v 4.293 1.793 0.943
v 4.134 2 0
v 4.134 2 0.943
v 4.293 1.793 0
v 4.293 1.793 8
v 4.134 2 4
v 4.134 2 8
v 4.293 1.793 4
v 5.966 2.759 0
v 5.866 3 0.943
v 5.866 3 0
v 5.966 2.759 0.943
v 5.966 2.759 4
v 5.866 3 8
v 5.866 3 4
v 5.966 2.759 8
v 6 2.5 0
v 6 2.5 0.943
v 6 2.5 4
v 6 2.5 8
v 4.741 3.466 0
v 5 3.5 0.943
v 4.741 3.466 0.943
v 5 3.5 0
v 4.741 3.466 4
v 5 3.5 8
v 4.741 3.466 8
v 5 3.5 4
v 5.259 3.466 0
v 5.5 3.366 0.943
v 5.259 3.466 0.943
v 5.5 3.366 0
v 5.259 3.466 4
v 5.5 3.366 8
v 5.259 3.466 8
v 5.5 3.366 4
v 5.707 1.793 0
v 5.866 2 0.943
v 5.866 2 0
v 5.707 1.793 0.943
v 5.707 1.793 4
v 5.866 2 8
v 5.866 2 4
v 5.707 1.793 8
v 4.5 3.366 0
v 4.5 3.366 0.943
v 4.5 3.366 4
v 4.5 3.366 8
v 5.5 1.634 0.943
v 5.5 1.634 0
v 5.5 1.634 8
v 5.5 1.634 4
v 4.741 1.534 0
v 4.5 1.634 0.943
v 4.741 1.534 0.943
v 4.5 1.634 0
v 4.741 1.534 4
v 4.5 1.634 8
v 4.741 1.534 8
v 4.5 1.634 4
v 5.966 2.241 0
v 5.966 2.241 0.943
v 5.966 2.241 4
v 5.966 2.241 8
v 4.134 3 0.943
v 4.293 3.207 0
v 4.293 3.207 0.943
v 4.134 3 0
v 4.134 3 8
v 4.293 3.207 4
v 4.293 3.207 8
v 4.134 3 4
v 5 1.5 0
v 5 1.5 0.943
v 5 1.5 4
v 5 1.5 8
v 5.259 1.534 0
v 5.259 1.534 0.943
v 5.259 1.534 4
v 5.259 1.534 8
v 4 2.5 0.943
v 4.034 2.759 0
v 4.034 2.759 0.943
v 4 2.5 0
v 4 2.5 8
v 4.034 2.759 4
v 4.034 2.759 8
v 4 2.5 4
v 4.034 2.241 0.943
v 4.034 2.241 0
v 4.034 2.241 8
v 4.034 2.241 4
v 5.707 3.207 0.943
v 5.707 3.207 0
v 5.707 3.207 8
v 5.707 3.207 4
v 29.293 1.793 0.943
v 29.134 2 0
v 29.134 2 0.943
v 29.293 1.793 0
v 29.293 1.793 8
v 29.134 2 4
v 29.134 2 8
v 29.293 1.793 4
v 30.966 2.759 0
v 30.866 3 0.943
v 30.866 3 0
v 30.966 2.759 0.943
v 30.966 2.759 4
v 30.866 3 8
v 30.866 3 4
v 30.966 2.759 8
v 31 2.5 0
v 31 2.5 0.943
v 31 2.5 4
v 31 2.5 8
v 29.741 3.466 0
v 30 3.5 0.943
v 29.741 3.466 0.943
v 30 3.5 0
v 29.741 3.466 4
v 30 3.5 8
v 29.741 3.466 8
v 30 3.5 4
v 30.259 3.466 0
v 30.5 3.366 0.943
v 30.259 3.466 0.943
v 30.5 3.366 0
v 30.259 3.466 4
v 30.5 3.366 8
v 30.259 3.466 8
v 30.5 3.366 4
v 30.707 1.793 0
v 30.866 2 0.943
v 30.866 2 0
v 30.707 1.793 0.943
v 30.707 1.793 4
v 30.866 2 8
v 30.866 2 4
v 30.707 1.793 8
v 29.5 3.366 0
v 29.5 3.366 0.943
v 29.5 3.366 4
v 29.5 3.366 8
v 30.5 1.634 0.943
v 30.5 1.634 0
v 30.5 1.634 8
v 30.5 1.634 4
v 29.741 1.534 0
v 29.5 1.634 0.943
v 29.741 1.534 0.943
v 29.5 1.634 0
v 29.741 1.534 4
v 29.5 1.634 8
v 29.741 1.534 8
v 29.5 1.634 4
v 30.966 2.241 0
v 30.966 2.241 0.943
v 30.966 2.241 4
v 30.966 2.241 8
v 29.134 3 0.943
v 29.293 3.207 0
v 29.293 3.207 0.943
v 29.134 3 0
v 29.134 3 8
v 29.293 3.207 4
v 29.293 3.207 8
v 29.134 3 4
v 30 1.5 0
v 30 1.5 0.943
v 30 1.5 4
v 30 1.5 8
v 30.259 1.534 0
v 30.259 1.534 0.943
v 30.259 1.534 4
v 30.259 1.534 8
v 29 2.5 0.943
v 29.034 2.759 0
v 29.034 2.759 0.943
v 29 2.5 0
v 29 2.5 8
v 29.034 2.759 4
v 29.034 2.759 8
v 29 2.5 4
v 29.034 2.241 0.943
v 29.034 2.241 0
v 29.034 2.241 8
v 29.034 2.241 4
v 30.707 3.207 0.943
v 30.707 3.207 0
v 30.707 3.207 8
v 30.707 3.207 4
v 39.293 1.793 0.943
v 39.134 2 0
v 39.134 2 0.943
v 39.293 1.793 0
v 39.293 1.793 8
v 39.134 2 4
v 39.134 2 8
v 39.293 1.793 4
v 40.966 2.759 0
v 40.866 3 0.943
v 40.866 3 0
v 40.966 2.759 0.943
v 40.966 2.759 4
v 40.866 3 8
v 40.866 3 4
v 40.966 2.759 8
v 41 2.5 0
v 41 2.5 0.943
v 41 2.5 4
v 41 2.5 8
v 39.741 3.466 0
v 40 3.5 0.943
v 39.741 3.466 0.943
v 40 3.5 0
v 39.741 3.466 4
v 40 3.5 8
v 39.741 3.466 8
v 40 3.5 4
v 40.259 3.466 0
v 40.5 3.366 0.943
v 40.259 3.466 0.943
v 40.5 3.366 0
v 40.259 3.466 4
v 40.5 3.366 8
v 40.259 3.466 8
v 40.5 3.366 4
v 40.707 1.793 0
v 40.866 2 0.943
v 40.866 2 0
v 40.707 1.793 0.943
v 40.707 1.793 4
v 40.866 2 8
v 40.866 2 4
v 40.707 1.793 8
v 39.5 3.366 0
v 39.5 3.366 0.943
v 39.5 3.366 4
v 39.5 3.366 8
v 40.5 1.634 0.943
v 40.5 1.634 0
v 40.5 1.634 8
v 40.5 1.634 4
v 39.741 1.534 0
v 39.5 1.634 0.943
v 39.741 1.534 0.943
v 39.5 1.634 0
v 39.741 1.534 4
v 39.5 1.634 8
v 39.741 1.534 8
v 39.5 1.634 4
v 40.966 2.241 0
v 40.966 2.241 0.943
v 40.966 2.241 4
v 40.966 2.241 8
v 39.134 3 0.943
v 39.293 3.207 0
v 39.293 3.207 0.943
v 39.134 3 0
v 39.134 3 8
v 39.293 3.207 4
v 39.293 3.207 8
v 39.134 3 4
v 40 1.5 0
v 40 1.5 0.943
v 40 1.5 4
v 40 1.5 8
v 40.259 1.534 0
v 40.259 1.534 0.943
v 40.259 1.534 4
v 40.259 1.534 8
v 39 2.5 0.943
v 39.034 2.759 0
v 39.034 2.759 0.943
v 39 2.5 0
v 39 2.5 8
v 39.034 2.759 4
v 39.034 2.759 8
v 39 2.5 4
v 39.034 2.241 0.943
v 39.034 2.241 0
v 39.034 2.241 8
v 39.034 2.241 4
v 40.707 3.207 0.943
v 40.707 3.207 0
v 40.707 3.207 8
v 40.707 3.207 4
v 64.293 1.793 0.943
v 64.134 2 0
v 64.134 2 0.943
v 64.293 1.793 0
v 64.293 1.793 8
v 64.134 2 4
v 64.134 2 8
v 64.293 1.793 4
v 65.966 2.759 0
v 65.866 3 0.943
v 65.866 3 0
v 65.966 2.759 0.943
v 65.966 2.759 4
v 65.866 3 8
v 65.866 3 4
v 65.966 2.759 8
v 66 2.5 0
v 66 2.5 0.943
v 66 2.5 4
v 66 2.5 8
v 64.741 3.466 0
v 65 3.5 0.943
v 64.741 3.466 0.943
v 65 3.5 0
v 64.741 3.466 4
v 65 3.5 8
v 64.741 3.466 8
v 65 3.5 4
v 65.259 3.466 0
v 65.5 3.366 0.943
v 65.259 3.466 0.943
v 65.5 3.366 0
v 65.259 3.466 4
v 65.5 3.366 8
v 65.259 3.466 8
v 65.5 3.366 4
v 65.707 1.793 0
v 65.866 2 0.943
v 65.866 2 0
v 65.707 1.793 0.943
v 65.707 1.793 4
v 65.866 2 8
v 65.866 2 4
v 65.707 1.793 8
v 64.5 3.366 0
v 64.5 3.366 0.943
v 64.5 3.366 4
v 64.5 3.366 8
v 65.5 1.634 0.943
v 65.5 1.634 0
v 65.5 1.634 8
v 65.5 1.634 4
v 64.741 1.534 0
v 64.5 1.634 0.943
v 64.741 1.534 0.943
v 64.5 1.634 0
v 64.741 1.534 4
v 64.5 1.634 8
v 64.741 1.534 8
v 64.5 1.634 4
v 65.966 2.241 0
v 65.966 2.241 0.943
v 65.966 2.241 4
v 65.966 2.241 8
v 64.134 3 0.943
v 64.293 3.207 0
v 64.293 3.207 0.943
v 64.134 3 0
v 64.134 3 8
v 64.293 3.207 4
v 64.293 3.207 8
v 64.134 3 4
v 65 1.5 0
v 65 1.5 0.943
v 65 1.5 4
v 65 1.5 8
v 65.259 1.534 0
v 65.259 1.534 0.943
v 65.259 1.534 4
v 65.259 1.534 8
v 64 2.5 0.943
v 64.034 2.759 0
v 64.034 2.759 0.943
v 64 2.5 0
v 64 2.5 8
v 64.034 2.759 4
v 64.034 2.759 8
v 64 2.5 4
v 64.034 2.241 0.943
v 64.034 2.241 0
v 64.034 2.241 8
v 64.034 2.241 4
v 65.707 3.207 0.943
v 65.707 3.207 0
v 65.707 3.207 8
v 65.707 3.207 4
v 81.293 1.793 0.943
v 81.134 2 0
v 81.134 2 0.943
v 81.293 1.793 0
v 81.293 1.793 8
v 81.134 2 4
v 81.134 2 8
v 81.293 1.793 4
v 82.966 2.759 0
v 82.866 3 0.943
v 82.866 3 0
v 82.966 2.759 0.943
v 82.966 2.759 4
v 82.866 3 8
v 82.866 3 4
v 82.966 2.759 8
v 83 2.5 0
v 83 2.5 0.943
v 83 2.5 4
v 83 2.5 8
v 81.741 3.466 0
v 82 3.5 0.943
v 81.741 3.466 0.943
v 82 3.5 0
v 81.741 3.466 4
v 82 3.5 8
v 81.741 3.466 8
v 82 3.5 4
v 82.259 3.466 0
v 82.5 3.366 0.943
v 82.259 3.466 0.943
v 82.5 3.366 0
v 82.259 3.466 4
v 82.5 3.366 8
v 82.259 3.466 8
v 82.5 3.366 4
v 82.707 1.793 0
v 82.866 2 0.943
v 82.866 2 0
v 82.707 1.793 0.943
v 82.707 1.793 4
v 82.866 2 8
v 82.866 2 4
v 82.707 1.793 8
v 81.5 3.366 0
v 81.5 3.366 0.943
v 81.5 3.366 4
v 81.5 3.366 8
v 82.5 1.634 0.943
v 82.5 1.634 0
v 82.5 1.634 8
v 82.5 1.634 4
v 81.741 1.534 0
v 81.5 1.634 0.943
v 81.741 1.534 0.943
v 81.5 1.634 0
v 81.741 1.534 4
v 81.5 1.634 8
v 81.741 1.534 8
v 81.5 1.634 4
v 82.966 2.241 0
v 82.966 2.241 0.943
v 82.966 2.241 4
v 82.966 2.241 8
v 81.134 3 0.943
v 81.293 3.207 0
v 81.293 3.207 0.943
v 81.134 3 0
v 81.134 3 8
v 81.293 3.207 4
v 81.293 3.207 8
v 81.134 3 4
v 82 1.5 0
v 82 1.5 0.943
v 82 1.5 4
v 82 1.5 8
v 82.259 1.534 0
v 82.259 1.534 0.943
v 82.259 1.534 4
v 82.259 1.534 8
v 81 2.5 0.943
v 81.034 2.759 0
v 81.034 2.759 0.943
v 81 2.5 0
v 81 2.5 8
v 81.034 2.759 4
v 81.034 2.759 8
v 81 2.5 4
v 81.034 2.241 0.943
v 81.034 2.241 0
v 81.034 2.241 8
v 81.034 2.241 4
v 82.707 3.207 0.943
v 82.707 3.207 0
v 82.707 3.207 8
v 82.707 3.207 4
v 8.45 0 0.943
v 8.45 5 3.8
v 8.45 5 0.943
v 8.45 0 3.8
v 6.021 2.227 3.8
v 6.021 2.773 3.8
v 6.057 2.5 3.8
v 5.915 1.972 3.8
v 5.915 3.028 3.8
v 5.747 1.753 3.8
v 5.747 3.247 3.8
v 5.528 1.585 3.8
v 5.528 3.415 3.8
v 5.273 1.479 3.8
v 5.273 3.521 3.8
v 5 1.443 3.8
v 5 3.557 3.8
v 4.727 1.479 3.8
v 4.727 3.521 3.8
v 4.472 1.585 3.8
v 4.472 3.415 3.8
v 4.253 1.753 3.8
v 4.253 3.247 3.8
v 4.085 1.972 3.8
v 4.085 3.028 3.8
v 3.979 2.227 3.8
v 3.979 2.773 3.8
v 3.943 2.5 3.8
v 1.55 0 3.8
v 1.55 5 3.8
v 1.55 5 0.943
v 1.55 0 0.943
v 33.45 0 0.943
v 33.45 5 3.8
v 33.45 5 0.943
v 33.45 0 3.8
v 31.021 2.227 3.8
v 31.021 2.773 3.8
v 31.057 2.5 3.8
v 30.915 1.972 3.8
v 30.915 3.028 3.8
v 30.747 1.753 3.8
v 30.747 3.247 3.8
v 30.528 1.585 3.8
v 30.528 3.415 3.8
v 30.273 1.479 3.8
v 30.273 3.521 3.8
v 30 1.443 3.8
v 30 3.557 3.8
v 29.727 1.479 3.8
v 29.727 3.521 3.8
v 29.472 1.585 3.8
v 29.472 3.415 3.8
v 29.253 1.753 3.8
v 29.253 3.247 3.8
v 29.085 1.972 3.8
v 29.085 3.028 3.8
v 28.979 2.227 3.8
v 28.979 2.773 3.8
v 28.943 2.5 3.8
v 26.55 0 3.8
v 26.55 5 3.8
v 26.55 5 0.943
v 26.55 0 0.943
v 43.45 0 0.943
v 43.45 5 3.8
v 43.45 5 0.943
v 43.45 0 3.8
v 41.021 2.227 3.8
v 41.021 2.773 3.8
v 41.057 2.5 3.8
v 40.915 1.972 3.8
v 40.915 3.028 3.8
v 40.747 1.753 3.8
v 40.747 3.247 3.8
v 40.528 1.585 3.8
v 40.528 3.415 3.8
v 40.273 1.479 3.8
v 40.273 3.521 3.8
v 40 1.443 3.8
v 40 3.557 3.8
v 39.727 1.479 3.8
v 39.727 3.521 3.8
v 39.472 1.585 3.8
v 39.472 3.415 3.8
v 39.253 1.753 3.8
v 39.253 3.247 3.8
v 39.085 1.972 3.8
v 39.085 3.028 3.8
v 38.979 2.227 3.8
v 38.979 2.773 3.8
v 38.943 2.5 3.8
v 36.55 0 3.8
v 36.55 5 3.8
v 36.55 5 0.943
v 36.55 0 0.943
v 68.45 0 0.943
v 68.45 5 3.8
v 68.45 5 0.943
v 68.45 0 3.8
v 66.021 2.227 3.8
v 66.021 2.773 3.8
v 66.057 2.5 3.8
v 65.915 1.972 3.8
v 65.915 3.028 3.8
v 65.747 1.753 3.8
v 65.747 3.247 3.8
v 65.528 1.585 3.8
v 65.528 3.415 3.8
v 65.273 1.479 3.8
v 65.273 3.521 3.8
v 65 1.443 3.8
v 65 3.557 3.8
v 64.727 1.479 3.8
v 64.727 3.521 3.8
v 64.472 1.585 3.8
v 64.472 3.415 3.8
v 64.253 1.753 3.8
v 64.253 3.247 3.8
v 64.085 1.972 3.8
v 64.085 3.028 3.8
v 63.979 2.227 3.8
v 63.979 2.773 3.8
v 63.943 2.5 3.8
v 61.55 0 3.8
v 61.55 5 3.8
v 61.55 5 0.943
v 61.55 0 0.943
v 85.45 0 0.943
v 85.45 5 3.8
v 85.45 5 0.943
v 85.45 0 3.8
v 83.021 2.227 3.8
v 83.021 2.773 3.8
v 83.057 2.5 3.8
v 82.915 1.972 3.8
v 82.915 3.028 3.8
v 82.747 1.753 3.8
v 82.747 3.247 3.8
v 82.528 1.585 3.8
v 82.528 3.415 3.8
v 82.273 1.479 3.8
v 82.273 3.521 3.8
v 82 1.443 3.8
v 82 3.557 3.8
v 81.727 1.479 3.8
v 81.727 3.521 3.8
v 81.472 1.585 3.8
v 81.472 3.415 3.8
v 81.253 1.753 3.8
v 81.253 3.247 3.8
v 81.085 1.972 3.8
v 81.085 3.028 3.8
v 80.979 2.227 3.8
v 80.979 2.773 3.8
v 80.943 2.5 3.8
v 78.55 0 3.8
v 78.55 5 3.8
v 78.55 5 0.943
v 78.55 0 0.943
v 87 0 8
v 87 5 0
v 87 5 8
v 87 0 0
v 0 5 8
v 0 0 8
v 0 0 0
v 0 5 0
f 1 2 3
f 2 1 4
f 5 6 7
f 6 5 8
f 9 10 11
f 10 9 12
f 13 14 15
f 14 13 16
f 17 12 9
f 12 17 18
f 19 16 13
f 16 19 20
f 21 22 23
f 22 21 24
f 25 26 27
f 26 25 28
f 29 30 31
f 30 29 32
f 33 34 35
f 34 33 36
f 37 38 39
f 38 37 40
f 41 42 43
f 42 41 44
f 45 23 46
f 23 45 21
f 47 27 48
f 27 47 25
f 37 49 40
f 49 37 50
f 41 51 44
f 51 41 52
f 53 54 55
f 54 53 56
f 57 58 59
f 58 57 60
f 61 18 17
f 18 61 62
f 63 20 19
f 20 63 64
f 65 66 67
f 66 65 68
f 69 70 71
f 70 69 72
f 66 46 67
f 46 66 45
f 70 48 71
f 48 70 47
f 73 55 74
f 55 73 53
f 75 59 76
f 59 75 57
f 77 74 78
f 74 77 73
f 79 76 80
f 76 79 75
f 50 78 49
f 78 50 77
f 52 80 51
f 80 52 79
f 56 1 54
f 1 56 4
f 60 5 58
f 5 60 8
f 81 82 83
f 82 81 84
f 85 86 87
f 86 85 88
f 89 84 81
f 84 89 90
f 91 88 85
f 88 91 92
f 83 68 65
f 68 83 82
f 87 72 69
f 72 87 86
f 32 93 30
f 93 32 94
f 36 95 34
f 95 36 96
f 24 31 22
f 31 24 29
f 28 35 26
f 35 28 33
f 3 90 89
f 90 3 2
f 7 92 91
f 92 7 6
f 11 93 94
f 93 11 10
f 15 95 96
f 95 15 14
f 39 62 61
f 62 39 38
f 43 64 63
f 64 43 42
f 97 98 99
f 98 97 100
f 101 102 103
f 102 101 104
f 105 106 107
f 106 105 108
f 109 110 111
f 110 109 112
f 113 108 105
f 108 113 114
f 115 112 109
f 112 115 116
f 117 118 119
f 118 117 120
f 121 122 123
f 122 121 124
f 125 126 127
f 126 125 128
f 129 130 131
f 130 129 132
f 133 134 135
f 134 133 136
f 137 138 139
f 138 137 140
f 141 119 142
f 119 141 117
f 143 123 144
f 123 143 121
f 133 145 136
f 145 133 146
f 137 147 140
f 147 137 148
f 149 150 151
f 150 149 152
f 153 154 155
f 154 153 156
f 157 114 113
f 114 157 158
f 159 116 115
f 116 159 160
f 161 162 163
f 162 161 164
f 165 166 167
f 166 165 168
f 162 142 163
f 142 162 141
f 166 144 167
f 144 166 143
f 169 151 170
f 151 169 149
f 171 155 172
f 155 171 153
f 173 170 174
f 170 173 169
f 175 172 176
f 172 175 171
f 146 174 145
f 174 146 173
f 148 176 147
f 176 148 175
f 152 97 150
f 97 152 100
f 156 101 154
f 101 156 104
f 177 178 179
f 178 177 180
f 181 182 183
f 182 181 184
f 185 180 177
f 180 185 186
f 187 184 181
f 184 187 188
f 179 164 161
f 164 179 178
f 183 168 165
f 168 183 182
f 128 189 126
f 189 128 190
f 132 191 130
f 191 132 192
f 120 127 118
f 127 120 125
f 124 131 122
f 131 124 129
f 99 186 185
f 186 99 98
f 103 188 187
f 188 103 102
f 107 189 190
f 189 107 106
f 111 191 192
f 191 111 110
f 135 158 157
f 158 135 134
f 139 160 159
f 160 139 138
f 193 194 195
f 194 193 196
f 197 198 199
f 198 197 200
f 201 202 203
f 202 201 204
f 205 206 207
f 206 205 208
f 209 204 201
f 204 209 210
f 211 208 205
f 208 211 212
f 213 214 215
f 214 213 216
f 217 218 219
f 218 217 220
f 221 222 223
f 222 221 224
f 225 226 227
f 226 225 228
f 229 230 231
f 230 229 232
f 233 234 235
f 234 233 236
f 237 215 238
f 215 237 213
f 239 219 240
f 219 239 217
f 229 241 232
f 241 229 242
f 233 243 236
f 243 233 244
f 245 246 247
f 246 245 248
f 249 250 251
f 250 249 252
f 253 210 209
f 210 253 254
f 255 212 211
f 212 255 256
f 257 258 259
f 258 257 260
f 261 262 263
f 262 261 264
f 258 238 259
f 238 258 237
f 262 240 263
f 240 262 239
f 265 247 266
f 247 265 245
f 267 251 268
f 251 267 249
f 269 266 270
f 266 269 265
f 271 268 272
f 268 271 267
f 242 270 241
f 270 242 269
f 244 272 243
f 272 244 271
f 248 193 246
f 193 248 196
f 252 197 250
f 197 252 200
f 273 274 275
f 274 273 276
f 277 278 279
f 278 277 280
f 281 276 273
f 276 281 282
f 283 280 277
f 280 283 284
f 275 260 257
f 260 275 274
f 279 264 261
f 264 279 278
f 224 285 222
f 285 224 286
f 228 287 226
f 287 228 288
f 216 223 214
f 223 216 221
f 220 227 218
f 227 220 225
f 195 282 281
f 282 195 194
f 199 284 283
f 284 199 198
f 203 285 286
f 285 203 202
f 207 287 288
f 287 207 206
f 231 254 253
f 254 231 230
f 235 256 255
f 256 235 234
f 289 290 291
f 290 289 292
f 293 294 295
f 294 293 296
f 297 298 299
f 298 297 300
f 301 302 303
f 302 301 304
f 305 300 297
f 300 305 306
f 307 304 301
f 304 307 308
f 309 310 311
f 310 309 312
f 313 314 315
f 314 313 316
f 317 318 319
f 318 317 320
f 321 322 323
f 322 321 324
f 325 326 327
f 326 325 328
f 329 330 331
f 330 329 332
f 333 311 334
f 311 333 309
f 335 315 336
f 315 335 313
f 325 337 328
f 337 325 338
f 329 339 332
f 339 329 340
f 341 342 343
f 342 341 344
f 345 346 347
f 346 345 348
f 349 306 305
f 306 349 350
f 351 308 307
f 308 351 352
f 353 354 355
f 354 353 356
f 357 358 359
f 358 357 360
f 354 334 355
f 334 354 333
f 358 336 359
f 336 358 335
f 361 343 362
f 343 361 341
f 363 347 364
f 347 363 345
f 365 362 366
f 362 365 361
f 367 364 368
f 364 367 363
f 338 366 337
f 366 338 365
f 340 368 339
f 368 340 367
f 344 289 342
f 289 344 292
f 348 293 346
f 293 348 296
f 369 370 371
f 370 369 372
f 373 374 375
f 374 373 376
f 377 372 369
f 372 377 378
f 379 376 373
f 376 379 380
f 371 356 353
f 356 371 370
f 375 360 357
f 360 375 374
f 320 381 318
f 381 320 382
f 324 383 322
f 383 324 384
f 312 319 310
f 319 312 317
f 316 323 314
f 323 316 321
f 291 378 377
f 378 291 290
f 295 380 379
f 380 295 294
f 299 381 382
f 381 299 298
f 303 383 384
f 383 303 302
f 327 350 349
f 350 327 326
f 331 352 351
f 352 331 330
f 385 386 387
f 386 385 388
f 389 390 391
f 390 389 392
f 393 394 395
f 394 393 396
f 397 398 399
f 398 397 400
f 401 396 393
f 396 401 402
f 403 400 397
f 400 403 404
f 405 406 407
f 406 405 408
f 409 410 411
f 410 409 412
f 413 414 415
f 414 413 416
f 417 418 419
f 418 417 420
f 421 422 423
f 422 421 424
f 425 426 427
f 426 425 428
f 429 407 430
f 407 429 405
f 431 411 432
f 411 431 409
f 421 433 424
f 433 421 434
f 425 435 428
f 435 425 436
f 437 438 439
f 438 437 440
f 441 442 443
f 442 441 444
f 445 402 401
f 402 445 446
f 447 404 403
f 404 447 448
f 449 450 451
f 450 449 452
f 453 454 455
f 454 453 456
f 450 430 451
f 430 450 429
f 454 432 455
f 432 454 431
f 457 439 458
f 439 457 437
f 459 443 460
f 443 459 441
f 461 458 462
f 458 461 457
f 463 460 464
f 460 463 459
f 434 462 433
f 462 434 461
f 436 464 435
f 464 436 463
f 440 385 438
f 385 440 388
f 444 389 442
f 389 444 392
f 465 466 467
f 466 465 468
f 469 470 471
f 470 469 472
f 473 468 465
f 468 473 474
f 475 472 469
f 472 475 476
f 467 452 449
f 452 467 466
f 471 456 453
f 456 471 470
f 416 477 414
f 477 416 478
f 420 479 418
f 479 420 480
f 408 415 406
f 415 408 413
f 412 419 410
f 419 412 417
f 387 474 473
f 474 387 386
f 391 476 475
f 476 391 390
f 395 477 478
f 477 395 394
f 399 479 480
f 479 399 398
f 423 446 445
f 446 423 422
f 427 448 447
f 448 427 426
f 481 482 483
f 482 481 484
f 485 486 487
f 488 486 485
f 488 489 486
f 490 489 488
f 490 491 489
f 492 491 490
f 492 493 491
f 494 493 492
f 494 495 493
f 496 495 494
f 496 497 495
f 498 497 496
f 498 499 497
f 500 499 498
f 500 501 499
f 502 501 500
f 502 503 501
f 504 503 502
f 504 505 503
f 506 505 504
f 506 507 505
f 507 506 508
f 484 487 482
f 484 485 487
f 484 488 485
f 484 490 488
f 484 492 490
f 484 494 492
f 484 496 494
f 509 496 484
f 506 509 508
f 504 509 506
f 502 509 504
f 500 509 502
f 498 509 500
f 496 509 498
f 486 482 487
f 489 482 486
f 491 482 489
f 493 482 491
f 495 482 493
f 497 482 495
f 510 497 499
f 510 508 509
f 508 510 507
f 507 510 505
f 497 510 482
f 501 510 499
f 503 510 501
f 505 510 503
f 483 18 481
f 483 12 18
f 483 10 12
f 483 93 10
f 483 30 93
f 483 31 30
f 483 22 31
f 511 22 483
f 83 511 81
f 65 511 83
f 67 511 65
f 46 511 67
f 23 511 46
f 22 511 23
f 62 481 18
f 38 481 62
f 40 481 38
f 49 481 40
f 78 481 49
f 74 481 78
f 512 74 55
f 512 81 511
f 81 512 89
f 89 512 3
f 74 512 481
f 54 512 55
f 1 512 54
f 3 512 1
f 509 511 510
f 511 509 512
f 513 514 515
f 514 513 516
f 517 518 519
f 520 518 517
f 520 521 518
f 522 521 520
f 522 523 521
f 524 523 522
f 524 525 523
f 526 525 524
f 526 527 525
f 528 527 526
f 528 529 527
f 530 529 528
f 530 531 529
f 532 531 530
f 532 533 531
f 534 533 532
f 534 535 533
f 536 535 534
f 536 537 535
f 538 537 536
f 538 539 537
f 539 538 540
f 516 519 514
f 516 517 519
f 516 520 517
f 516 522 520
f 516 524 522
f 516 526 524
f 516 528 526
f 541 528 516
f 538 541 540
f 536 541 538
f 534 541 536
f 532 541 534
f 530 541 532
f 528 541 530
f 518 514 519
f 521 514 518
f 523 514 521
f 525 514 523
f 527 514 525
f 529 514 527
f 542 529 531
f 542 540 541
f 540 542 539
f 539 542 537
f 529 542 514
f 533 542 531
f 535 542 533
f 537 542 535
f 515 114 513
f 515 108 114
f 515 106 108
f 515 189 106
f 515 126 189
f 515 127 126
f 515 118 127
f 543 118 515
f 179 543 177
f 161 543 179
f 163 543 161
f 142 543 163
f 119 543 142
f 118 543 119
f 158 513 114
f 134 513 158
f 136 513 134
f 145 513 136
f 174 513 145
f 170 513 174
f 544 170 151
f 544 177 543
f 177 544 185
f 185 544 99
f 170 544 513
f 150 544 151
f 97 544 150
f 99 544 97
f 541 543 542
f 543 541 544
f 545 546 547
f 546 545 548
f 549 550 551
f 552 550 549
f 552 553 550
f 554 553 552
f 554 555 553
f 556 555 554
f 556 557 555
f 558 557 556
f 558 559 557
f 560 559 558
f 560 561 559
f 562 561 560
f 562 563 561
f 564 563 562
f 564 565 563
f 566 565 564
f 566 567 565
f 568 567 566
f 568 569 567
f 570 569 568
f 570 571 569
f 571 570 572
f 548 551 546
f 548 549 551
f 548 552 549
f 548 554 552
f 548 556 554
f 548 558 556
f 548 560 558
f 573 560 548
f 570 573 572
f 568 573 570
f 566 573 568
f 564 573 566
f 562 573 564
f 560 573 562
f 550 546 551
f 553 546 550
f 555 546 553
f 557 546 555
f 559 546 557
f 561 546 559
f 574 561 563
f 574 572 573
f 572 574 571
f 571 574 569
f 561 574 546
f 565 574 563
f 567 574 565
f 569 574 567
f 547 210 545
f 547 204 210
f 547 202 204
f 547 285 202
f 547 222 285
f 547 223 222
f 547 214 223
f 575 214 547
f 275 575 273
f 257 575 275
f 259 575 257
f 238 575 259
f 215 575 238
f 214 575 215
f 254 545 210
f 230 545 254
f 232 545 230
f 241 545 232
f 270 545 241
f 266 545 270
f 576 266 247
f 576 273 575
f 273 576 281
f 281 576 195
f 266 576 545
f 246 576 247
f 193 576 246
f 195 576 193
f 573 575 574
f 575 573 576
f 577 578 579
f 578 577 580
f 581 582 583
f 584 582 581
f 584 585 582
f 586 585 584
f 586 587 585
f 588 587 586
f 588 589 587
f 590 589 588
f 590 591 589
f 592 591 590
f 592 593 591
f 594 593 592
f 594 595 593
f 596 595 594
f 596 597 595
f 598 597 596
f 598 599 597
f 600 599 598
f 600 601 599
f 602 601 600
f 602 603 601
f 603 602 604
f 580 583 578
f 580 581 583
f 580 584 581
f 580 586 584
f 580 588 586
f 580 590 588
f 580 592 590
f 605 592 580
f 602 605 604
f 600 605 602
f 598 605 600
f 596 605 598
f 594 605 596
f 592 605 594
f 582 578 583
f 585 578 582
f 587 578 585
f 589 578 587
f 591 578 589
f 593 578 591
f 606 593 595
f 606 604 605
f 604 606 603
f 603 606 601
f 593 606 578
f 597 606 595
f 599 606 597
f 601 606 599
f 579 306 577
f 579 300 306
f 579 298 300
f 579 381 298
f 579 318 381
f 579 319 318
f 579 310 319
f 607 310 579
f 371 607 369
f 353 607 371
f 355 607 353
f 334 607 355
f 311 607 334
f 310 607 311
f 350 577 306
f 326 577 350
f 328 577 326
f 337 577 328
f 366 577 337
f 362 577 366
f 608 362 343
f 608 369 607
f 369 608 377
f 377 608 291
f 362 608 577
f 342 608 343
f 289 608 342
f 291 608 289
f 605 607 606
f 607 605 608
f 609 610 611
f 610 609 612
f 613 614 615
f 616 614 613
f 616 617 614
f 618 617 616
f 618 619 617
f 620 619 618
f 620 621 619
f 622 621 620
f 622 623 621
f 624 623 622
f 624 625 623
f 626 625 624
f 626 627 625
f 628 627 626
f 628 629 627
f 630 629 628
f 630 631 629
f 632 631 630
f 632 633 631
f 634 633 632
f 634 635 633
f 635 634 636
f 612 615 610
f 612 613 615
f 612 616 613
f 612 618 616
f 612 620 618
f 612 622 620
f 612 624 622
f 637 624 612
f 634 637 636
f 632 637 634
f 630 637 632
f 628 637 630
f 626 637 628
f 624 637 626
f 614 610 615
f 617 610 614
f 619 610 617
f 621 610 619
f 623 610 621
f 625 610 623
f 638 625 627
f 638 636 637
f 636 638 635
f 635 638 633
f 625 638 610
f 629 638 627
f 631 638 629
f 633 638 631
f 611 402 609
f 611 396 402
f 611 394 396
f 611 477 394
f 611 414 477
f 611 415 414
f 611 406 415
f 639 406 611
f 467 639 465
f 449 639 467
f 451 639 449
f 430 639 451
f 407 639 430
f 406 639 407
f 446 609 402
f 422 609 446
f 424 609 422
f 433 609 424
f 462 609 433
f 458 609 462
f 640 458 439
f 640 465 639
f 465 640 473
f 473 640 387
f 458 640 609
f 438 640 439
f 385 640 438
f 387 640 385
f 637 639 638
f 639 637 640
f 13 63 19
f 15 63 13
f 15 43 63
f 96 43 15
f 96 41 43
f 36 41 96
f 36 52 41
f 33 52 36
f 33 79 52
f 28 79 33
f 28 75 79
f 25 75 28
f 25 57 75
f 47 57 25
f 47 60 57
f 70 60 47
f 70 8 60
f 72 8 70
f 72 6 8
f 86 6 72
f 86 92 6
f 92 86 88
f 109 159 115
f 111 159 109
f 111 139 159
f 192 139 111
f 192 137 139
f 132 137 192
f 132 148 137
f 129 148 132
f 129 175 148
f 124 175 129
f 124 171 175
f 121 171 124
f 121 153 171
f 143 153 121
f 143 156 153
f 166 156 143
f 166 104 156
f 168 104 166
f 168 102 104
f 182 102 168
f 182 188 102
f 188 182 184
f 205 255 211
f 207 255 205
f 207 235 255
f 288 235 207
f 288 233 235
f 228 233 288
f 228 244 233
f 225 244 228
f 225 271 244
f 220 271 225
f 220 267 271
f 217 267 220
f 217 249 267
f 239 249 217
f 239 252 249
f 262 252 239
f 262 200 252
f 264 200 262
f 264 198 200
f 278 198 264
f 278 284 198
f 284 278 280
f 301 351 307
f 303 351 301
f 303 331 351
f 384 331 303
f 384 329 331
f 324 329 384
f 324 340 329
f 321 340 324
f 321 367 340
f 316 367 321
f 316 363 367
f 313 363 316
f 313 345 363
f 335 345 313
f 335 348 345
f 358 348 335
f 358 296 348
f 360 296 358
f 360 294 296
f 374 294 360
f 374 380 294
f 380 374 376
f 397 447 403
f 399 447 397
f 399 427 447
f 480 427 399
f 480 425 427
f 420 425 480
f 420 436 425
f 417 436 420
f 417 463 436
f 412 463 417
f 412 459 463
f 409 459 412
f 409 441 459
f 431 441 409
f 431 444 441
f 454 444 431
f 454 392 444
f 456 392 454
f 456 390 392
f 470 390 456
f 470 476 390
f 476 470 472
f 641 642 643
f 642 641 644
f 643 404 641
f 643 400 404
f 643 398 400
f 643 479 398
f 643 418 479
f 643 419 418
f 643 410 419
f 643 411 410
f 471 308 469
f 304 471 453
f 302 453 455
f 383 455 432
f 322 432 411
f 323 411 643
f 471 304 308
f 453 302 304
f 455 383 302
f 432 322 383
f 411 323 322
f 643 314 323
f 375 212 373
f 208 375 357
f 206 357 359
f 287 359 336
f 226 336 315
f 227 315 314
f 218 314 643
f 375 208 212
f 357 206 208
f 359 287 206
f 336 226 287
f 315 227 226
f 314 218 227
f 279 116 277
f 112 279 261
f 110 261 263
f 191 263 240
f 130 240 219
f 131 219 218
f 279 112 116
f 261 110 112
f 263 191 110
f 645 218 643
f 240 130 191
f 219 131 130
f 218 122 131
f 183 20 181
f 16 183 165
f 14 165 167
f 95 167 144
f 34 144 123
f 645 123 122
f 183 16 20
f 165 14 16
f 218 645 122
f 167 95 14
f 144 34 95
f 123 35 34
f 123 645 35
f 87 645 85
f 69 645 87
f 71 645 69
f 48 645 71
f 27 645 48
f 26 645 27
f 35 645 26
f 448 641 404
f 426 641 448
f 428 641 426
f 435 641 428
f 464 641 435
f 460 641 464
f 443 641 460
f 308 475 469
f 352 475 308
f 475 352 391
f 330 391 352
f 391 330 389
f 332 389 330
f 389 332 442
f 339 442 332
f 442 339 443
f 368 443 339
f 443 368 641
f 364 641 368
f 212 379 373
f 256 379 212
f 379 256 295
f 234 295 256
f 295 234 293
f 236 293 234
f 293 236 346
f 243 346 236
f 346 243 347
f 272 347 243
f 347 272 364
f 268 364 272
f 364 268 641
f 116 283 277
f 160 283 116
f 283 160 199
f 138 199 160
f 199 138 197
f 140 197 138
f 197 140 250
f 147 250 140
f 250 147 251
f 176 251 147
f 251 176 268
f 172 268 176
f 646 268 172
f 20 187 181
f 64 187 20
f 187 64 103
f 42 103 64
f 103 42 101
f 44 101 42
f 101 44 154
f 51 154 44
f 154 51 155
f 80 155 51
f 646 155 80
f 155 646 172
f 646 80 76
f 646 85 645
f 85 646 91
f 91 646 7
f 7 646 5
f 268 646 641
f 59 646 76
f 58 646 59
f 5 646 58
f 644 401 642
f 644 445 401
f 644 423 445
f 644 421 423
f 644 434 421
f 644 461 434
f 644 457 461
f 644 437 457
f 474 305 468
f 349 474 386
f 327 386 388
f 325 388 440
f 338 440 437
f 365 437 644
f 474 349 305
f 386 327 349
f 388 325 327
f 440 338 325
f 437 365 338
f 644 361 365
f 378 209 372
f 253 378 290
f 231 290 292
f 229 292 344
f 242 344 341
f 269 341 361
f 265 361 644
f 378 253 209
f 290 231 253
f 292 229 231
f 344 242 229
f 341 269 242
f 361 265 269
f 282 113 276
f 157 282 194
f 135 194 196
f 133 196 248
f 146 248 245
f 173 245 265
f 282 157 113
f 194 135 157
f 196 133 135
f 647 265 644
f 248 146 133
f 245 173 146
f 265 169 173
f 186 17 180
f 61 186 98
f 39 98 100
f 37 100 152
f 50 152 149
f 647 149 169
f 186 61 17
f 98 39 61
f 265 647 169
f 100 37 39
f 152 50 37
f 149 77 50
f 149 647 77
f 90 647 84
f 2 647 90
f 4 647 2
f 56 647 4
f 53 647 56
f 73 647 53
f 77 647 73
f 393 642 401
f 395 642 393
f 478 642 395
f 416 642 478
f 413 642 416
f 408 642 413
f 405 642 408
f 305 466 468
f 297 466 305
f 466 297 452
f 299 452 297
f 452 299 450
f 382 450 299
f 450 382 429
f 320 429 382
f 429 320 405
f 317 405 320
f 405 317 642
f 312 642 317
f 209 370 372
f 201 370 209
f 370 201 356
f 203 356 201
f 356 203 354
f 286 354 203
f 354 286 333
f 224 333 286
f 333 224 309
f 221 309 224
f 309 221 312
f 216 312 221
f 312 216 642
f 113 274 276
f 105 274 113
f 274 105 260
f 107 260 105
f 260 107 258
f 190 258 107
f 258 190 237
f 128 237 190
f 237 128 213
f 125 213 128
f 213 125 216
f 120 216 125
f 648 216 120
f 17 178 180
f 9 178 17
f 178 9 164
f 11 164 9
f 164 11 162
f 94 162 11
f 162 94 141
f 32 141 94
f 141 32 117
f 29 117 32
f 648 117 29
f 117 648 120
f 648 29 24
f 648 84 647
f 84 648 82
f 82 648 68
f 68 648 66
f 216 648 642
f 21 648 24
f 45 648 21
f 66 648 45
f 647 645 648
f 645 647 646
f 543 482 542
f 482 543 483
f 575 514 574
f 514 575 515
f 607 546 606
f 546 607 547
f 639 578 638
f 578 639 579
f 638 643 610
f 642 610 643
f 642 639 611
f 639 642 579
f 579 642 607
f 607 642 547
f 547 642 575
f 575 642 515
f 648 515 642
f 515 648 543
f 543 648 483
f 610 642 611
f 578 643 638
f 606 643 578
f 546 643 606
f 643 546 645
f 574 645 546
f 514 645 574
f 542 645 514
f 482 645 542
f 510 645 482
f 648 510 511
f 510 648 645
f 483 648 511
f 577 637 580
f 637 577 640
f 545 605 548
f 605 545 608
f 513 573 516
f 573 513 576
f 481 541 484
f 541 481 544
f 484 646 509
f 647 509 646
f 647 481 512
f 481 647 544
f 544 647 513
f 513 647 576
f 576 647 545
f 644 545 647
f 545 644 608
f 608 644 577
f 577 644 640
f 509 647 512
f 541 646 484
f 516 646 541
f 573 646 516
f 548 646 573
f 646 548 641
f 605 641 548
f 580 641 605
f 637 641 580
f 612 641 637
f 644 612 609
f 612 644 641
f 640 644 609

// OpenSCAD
// file: basic_shapes.scad
include <values.scad>;

module hole_array(xs, diameter, height, y = 0, z = 0, square = false) {
    for (x = xs) {
        translate([x, y, z]) {
            if (square) {
                translate([diameter / -2, diameter / -2, 0]) {
                    cube([diameter, diameter, height]);
                }
            } else {
                cylinder(d = diameter, h = height);
            }
        }
    }
}

module spacer_array(
    positions,
    height,
    wall = 2,
    hole_diameter = PCB_MOUNT_HOLE_DIAMETER,
    z = 0,
    $fn = DEFAULT_ROUNDING
) {
    for (position = positions) {
        translate([position.x, position.y, z]) {
            ring(
                diameter = hole_diameter + wall * 2,
                inner_diameter = hole_diameter,
                height = height
            );
        }
    }
}

module flat_top_rectangular_pyramid(
    top_width = 0,
    top_length = 0,

    bottom_width = 0,
    bottom_length = 0,

    height = 0,

    top_x = undef,
    top_y = undef,

    top_weight_x = .5,
    top_weight_y = .5
) {
    top_x = top_x != undef
        ? top_x
        : (bottom_width - top_width) * top_weight_x;
    top_y = top_y != undef
        ? top_y
        : (bottom_length - top_length) * top_weight_y;

    max_difference = max(bottom_width - top_width, bottom_length - top_length);
    height = height == undef
        ? max_difference / 2
        : height;

    polyhedron(
        [
            [0, 0, 0],
            [bottom_width, 0, 0],
            [bottom_width, bottom_length, 0],
            [0, bottom_length, 0],
            [top_x, top_y, height],
            [top_width + top_x, top_y, height],
            [top_width + top_x, top_length + top_y, height],
            [top_x, top_length + top_y, height]
        ], [
            [0, 1, 2, 3],
            [4, 5, 1, 0],
            [7, 6, 5, 4],
            [5, 6, 2, 1],
            [6, 7, 3, 2],
            [7, 4, 0, 3]
        ]
    );
}

module rounded_cube(dimensions, radius, $fn = $fn) {
    positions = [
        [radius, radius, radius],
        [dimensions.x - radius, radius, radius],
        [dimensions.x - radius, dimensions.y - radius, radius],
        [radius, dimensions.y - radius, radius],
        [radius, radius, dimensions.z - radius],
        [dimensions.x - radius, radius, dimensions.z - radius],
        [dimensions.x - radius, dimensions.y - radius, dimensions.z - radius],
        [radius, dimensions.y - radius, dimensions.z - radius],
    ];

    if (radius > 0) {
        hull() {
            for (position = positions) {
                translate(position) sphere(r = radius);
            }
        }
    } else {
        cube(dimensions);
    }
}

module support_wall(
    dimensions,
    is_back = true,
    railing_diameter = 3.5,
    support_width = 2,
    support_length = 4,
    gutter = 4
) {
    railing_z = railing_diameter / 4;

    module _support(height = dimensions[2], depth = support_length) {
        translate([0, -depth, 0]) {
            flat_top_rectangular_pyramid(
                top_width = support_width,
                top_length = 0,
                bottom_width = support_width,
                bottom_length = support_length,
                height = height,
                top_weight_y = 1
            );
        }
    }

    translate(is_back ? [0, dimensions[1], 0] : [0, 0, 0]) {
        mirror(is_back ? [0, 1, 0] : [0, 0, 0]) {
            cube(dimensions);

            translate([0, dimensions[1] / 2, dimensions[2] + railing_z]) {
                rotate([0, 90, 0]) {
                    cylinder(
                        d = railing_diameter,
                        h = dimensions[0],
                        $fn = 9
                    );
                }
            }

            translate([gutter, 0, 0]) {
                _support();
            }
            translate([dimensions[0] - support_length - gutter, 0, 0]) {
                _support();
            }
        }
    }
}

module ring(
    diameter,
    height,
    thickness, inner_diameter = 0
) {
    e = 0.034;
    thickness = thickness != undef
        ? thickness
        : (diameter - inner_diameter) / 2;

    difference() {
        cylinder(d = diameter, h = height);

        translate([0, 0, -e]) {
            cylinder(d = diameter - thickness * 2, h = height + e * 2);
        }
    }
}

module cylinder_grip(
    diameter,
    height,
    count,
    rotation_offset = 0,
    size = 1,
    $fn = undef
) {
    if (size > 0) {
        count = count != undef
            ? count
            : floor((diameter * PI) / size / 2);

        for (i = [0 : count - 1]) {
            rotate([0, 0, rotation_offset + 360 * i / count]) {
                translate([0, diameter / 2, 0]) {
                    cylinder(d = size, h = height);
                }
            }
        }
    }
}

module rounded_corner_cutoff(height, radius, angle = 0, e = 1.123, $fn = $fn) {
    difference() {
        rotate([0, 0, angle]) {
            cube([radius + e, radius + e, height]);
        }

        translate([0, 0, -e]) {
            cylinder(r = radius, h = height + e * 2);
        }
    }
}

rounded_corner_cutoff(height = 15, radius = 5);
// file: values.scad
DEFAULT_ROUNDING = 24;
HIDEF_ROUNDING = 120;

SACRIFICIAL_BRIDGE_HEIGHT = .2;
BREAKAWAY_SUPPORT_DEPTH = .6;
BREAKAWAY_SUPPORT_GUTTER = 1;

PCB_WIDTH = 183.954;
PCB_LENGTH = 120.142;
PCB_HEIGHT = 1.6;
PCB_MOUNT_HOLE_DIAMETER = 3.2;

PCB_BATTERY_CAVITY_X = 135.382;
PCB_BATTERY_CAVITY_Y = 54.102;
PCB_BATTERY_CAVITY_LENGTH = PCB_LENGTH - PCB_BATTERY_CAVITY_Y + 1;

PCB_COMPONENTS_X = 2.54;
PCB_COMPONENTS_Y = 33.528;
PCB_COMPONENTS_WIDTH = PCB_BATTERY_CAVITY_X - PCB_COMPONENTS_X - 2.54 * 2;
PCB_COMPONENTS_LENGTH = PCB_LENGTH - PCB_COMPONENTS_Y - 2.54;
PCB_COMPONENTS_HEIGHT = 12;

PCB_SWITCH_X = 168.148;
PCB_SWITCH_Y = 9.148;

PCB_LED_X = 158.75;
PCB_LED_Y = 36.576;

BUTTON_DIAMETER = 6;
BUTTON_LENGTH = 6.6;
BUTTON_WIDTH = 4.5;
BUTTON_HEIGHT = 6;

POT_HEIGHT = 7.8;

/* Commented out lines are on PCB but not needed for assembly */
TOP_MOUNTED_PCB_HOLES = [
    [8.164, 3.048],
    /* [46.264, 3.048], */
    [64.044, 3.048],
    /* [137.704, 3.048], */
    [119.924, 3.048],
    [175.804, 3.048],
];

BOTTOM_MOUNTED_PCB_HOLES = [
    [8.164, 27.94],
    [64.044, 27.94],
    [175.804, 27.94],
    [119.924, 27.94],
];

BACK_PCB_HOLES = [
    [26.416, 98.298],
    [108.712, 98.298],
];

WIRE_RELIEF_HOLES = [
    [172.466, 50.038],
    [164.338, 50.038],
];

PCB_HOLES = concat(
    TOP_MOUNTED_PCB_HOLES,
    BOTTOM_MOUNTED_PCB_HOLES,
    BACK_PCB_HOLES,
    WIRE_RELIEF_HOLES
);

PCB_BUTTONS = [
    [10.414, 14.224 - BUTTON_LENGTH],
    [18.034, 19.304 - BUTTON_LENGTH],
    [25.654, 14.224 - BUTTON_LENGTH],
    [33.274, 19.304 - BUTTON_LENGTH],
    [40.894, 14.224 - BUTTON_LENGTH],
    [48.514, 19.304 - BUTTON_LENGTH],
    [56.134, 14.224 - BUTTON_LENGTH],
    [71.374, 14.224 - BUTTON_LENGTH],
    [78.994, 19.304 - BUTTON_LENGTH],
    [86.614, 14.224 - BUTTON_LENGTH],
    [94.234, 19.304 - BUTTON_LENGTH],
    [101.854, 14.224 - BUTTON_LENGTH],
    [117.094, 14.224 - BUTTON_LENGTH],
    [124.714, 19.304 - BUTTON_LENGTH],
    [132.334, 14.224 - BUTTON_LENGTH],
    [139.954, 19.304 - BUTTON_LENGTH],
    [147.574, 14.224 - BUTTON_LENGTH],
    [155.194, 19.304 - BUTTON_LENGTH],
    [162.814, 14.224 - BUTTON_LENGTH],
    [178.054, 14.224 - BUTTON_LENGTH],
];

PCB_VOLUME_WHEEL_X = 179.578;
PCB_VOLUME_WHEEL_Y = 42.164;

SCREW_HEAD_DIAMETER = 6;
SCREW_HEAD_HEIGHT = 2.1;
NUT_DIAMETER = 6.4;
NUT_HEIGHT = 2.4;

MOUNT_STILT_MINIMUM_HEIGHT = NUT_HEIGHT + .5 + 2; // TODO: tidy against mount_stilt args

NATURAL_KEY_SEQUENCES = [
    [1,0,1,0,1,1,0,1,0,1,0,1,],
    [0,1,0,1,1,0,1,0,1,0,1,1,],
    [1,0,1,1,0,1,0,1,0,1,1,0,],
    [0,1,1,0,1,0,1,0,1,1,0,1,],
    [1,1,0,1,0,1,0,1,1,0,1,0,],
    [1,0,1,0,1,0,1,1,0,1,0,1,],
    [0,1,0,1,0,1,1,0,1,0,1,1,],
    [1,0,1,0,1,1,0,1,0,1,1,0,],
    [0,1,0,1,1,0,1,0,1,1,0,1,],
    [1,0,1,1,0,1,0,1,1,0,1,0,],
    [0,1,1,0,1,0,1,1,0,1,0,1,],
    [1,1,0,1,0,1,1,0,1,0,1,0,],
];

HINGE_CLASP_DEFAULT_PIN_DIAMETER = 1.75; // filament diameter
HINGE_CLASP_DEFAULT_MINIMAL_SUPPORT = 1.5;
HINGE_CLASP_MINIMUM_TOOTH_WIDTH = 5;
HINGE_CLASP_MINIMUM_TOOTH_COUNT = 5;
HINGE_CLASP_MINIMUM_WIDTH = HINGE_CLASP_MINIMUM_TOOTH_WIDTH
    * HINGE_CLASP_MINIMUM_TOOTH_COUNT;
MINIMUM_HINGE_CLASP_LENGTH = 20;

HINGE_CLASP_SIDE_FRONT_BACK = 0;
HINGE_CLASP_SIDE_LEFT_RIGHT = 1;

LIP_BOX_DEFAULT_LIP_HEIGHT = 3;

BATTERY_WIDTH = 48.6;
BATTERY_LENGTH = 25.8;
BATTERY_HEIGHT = 17.1;
BATTERY_SNAP_WIDTH = 4.2;

/* S20X35VFS */
SPEAKER_DIAMETER = 41.1;
SPEAKER_HEIGHT = 23.5;
SPEAKER_LENGTH = 71;
SPEAKER_CLEARANCE = 2;
SPEAKER_PLATE_HOLE_DIAMETER = 3.6;
SPEAKER_PLATE_HOLE_XY = 4;
SPEAKER_PLATE_HEIGHT = .8;
SPEAKER_RIM_DEPTH = 3.8;
SPEAKER_RIM_HEIGHT = 1.4 - .4; // explicitly undersizing for good fit
SPEAKER_CONE_DIAMETER = 38;
SPEAKER_MAGNET_DIAMETER = 22;
SPEAKER_MAGNET_HEIGHT = 7.5;

/* https://www.ckswitches.com/media/1428/os.pdf */
SWITCH_BASE_WIDTH = 4.4;
SWITCH_BASE_LENGTH = 8.7;
SWITCH_BASE_HEIGHT = 4.5;
SWITCH_ACTUATOR_WIDTH = 2;
SWITCH_ACTUATOR_LENGTH = 2.1;
SWITCH_ACTUATOR_HEIGHT = 3.8;
SWITCH_ACTUATOR_TRAVEL = 1.5;
SWITCH_ORIGIN = [SWITCH_BASE_WIDTH / 2, 6.36];

LED_DIAMETER = 5.9;
LED_HEIGHT = 8.6;

PENCIL_STAND_CAVITY_DIAMETER = 8.5;

PLASTICS_TOLERANCE = 1.524; // https://www.tapplastics.com/product/plastics/cut_to_size_plastic
WINDOW_PANE_HEIGHT = 25.4 * 1 / 8;

HITCH_DEFAULT_MOUNT_SCREW_HEAD_CLEARANCE = .1;
HITCH_DEFAULT_SCREW_FLOOR = .4;
HITCH_RECOMMENDED_MINIMUM_CAVITY_HEIGHT = SCREW_HEAD_HEIGHT
    + HITCH_DEFAULT_MOUNT_SCREW_HEAD_CLEARANCE
    + HITCH_DEFAULT_SCREW_FLOOR
    + (SCREW_HEAD_DIAMETER - PCB_MOUNT_HOLE_DIAMETER) / 2;
// main file
include <values.scad>;

use <basic_shapes.scad>;

module mounting_rail(
    width = 0,
    length = 0,
    height = 1,
    hole_xs = [],
    hole_xs_x_offset = 0,
    hole_y = undef,
    hole_diameter = PCB_MOUNT_HOLE_DIAMETER,

    head_hole_diameter = SCREW_HEAD_DIAMETER,
    head_hole_height = SCREW_HEAD_HEIGHT,

    include_nut_cavity = false,
    nut_lock_diameter = NUT_DIAMETER + .5,
    nut_lock_height = NUT_HEIGHT + .4,
    nut_lock_z = 0,

    // TODO: obviate
    include_sacrificial_bridge = false,

    $fn = DEFAULT_ROUNDING
) {
    e = 0.0567;

    module _hole_array(
        diameter = head_hole_diameter,
        height = head_hole_height + e,
        z = -e,
        square = false
    ) {
        translate([hole_xs_x_offset, 0, 0]) {
            hole_array(
                hole_xs,
                diameter,
                height,
                hole_y != undef ? hole_y : length / 2,
                z,
                square = square
            );
        }
    }

    module _cavities() {
        difference() {
            union() {
                _hole_array(
                    diameter = hole_diameter,
                    height = height + e * 2,
                    z = -e
                );

                if (include_nut_cavity) {
                    _hole_array(
                        diameter = nut_lock_diameter,
                        height = nut_lock_height + e,
                        z = nut_lock_z - e,
                        square = true
                    );
                }
            }

            // TODO: bridge top vs bottom
            if (
                include_nut_cavity
                && include_sacrificial_bridge
                && (nut_lock_z + nut_lock_height < height)
            ) {
                _hole_array(
                    diameter = hole_diameter + e * 2,
                    height = SACRIFICIAL_BRIDGE_HEIGHT,
                    z = nut_lock_z + nut_lock_height
                );
            }
        }
    }

    difference() {
        cube([width, length, height]);
        _cavities();
    }
}

mounting_rail(
    width = 10 * 8 + 1 * (8 - 1),
    length = 5,
    height = 8,
    hole_xs = [5, 30, 40, 65, 82],
    hole_diameter = 2,
    include_nut_cavity = true,
    nut_lock_z = 1,
    include_sacrificial_bridge = true
);
